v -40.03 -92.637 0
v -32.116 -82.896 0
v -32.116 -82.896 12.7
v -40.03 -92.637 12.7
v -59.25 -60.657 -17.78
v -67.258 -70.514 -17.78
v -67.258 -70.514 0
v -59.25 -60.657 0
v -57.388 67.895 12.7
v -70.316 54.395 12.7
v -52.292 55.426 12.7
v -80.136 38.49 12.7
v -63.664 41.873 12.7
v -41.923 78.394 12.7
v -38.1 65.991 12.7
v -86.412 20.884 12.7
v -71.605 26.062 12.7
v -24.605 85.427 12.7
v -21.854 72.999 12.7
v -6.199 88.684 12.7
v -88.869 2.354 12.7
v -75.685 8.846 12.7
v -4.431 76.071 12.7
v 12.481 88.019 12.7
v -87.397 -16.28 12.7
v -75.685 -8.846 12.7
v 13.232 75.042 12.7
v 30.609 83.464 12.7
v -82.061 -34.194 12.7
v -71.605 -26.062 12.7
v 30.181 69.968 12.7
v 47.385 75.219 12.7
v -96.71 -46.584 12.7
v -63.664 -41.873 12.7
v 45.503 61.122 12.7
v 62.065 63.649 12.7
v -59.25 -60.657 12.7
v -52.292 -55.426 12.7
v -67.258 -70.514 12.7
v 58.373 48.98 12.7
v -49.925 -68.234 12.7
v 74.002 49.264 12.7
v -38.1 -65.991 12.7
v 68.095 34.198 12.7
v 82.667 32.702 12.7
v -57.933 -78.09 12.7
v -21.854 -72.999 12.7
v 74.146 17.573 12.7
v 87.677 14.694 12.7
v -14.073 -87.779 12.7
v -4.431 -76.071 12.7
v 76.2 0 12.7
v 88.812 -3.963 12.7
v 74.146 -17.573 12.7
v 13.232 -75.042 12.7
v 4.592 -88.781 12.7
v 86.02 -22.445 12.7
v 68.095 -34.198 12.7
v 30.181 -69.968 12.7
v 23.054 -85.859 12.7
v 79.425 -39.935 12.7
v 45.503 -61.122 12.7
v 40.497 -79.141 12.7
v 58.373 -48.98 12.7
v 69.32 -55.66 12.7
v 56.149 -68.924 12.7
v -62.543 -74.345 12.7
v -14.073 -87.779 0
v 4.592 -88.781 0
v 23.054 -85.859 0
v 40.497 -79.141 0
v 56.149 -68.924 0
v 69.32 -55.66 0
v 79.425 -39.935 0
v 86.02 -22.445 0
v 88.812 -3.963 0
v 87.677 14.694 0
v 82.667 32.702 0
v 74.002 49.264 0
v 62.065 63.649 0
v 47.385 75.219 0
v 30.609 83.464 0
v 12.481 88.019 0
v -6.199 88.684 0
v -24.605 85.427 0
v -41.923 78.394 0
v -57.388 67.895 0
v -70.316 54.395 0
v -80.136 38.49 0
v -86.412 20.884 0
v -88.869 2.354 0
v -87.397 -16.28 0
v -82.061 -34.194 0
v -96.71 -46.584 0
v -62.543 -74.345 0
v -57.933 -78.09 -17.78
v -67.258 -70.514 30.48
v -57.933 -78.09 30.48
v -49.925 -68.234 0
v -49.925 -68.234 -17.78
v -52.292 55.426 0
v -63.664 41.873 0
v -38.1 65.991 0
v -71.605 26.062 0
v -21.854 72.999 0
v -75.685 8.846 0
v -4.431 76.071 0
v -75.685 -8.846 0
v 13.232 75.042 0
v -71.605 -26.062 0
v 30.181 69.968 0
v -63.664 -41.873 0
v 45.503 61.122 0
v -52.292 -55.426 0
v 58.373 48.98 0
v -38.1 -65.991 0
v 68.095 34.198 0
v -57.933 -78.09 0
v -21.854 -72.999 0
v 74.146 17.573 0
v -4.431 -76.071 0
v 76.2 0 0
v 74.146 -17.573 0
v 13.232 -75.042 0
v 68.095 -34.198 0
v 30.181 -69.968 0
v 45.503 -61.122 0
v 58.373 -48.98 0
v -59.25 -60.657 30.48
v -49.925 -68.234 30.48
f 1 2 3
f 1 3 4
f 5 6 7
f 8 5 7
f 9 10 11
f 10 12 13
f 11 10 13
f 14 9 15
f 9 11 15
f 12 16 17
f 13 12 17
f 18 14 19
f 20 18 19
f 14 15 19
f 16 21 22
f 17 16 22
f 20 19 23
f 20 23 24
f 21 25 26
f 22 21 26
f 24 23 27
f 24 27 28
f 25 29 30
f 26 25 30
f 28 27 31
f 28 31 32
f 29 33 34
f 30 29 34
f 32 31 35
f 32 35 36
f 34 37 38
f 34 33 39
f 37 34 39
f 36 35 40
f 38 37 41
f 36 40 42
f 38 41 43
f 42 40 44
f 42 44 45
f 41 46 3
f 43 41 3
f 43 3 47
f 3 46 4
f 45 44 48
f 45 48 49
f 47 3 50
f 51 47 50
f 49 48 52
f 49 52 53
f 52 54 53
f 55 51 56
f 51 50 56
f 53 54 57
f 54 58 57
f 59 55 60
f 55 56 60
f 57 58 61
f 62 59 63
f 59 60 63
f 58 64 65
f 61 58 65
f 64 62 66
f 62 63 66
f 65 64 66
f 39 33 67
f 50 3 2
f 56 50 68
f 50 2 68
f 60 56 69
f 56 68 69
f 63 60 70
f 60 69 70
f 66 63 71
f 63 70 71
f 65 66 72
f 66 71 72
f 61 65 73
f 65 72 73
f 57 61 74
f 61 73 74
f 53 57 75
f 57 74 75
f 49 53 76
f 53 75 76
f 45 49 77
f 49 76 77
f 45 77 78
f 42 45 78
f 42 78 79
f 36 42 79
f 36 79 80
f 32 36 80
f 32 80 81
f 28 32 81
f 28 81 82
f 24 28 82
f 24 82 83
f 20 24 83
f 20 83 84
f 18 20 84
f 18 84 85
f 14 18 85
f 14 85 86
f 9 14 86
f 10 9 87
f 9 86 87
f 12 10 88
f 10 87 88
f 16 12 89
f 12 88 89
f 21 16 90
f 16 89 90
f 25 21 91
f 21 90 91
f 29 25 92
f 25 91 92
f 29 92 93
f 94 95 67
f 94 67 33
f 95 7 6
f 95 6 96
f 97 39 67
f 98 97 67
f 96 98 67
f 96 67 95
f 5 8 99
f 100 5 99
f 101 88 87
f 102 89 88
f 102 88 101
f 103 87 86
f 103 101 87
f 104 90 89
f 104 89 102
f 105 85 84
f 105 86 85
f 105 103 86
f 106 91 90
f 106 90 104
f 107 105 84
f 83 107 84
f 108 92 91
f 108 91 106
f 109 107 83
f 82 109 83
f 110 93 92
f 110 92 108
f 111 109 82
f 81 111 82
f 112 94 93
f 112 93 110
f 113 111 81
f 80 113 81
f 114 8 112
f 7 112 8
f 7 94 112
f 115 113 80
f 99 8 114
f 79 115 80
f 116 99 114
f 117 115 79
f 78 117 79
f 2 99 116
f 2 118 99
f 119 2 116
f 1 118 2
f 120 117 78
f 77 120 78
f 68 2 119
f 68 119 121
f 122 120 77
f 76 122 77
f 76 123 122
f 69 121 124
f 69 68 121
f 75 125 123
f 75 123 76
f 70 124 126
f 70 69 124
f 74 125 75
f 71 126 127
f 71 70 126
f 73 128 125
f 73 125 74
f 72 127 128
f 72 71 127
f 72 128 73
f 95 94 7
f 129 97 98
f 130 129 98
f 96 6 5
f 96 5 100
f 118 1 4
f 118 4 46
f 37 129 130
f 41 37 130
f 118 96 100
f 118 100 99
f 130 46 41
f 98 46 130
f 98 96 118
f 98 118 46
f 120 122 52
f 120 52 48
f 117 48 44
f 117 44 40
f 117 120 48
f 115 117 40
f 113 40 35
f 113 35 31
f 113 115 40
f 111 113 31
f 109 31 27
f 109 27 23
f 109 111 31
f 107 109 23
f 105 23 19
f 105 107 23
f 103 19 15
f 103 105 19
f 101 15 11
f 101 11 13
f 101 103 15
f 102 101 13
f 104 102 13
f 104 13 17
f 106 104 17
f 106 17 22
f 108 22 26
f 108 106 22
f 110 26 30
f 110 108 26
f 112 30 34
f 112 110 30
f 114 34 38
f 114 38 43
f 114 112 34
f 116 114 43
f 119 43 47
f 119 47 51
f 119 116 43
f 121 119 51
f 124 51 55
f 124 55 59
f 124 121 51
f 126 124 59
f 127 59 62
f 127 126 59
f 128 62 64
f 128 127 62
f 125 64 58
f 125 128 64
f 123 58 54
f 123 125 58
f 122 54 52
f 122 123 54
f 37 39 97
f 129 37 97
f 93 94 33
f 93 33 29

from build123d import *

# Parameters (mm, degrees)
F0_R     = 88.9
F0_R_2   = 76.2
F1_DEPTH = 12.7
F3_DEPTH = 12.7
F4_W     = 12.015413
F4_H     = 48.26
F5_DEPTH = 12.7


with BuildPart() as f1:
    # F0 (on Top) → F1 (new body)
    with BuildSketch(Plane.XY):
        Circle(F0_R)
        Circle(F0_R_2, mode=Mode.SUBTRACT)
    extrude(amount=F1_DEPTH)

    # F2 (on face) → F3 (join)
    with BuildSketch(Plane(origin=(0, 0, 0), x_dir=(1, 0, 0), z_dir=(0, 0, -1))):
        with BuildLine():
            Line((-96.710376, 46.583939), (-82.060736, 34.194234))
            ThreePointArc((-82.060736, 34.194234), (-59.732506, 61.256656), (-32.116206, 82.896075))
            Line((-32.116206, 82.896075), (-40.030304, 92.636503))
            Line((-40.030304, 92.636503), (-96.710376, 46.583939))
        make_face()
    extrude(amount=-F3_DEPTH)

    # F4 (on face) → F5 (join)
    with BuildSketch(Plane(origin=(-61.255331, -75.391167, 0), x_dir=(0.776114, -0.630593, 0), z_dir=(-0.630593, -0.776114, 0))):
        with Locations((-1.727114, 6.35)):
            Rectangle(F4_W, F4_H)
    extrude(amount=-F5_DEPTH)


solid = f1.part
